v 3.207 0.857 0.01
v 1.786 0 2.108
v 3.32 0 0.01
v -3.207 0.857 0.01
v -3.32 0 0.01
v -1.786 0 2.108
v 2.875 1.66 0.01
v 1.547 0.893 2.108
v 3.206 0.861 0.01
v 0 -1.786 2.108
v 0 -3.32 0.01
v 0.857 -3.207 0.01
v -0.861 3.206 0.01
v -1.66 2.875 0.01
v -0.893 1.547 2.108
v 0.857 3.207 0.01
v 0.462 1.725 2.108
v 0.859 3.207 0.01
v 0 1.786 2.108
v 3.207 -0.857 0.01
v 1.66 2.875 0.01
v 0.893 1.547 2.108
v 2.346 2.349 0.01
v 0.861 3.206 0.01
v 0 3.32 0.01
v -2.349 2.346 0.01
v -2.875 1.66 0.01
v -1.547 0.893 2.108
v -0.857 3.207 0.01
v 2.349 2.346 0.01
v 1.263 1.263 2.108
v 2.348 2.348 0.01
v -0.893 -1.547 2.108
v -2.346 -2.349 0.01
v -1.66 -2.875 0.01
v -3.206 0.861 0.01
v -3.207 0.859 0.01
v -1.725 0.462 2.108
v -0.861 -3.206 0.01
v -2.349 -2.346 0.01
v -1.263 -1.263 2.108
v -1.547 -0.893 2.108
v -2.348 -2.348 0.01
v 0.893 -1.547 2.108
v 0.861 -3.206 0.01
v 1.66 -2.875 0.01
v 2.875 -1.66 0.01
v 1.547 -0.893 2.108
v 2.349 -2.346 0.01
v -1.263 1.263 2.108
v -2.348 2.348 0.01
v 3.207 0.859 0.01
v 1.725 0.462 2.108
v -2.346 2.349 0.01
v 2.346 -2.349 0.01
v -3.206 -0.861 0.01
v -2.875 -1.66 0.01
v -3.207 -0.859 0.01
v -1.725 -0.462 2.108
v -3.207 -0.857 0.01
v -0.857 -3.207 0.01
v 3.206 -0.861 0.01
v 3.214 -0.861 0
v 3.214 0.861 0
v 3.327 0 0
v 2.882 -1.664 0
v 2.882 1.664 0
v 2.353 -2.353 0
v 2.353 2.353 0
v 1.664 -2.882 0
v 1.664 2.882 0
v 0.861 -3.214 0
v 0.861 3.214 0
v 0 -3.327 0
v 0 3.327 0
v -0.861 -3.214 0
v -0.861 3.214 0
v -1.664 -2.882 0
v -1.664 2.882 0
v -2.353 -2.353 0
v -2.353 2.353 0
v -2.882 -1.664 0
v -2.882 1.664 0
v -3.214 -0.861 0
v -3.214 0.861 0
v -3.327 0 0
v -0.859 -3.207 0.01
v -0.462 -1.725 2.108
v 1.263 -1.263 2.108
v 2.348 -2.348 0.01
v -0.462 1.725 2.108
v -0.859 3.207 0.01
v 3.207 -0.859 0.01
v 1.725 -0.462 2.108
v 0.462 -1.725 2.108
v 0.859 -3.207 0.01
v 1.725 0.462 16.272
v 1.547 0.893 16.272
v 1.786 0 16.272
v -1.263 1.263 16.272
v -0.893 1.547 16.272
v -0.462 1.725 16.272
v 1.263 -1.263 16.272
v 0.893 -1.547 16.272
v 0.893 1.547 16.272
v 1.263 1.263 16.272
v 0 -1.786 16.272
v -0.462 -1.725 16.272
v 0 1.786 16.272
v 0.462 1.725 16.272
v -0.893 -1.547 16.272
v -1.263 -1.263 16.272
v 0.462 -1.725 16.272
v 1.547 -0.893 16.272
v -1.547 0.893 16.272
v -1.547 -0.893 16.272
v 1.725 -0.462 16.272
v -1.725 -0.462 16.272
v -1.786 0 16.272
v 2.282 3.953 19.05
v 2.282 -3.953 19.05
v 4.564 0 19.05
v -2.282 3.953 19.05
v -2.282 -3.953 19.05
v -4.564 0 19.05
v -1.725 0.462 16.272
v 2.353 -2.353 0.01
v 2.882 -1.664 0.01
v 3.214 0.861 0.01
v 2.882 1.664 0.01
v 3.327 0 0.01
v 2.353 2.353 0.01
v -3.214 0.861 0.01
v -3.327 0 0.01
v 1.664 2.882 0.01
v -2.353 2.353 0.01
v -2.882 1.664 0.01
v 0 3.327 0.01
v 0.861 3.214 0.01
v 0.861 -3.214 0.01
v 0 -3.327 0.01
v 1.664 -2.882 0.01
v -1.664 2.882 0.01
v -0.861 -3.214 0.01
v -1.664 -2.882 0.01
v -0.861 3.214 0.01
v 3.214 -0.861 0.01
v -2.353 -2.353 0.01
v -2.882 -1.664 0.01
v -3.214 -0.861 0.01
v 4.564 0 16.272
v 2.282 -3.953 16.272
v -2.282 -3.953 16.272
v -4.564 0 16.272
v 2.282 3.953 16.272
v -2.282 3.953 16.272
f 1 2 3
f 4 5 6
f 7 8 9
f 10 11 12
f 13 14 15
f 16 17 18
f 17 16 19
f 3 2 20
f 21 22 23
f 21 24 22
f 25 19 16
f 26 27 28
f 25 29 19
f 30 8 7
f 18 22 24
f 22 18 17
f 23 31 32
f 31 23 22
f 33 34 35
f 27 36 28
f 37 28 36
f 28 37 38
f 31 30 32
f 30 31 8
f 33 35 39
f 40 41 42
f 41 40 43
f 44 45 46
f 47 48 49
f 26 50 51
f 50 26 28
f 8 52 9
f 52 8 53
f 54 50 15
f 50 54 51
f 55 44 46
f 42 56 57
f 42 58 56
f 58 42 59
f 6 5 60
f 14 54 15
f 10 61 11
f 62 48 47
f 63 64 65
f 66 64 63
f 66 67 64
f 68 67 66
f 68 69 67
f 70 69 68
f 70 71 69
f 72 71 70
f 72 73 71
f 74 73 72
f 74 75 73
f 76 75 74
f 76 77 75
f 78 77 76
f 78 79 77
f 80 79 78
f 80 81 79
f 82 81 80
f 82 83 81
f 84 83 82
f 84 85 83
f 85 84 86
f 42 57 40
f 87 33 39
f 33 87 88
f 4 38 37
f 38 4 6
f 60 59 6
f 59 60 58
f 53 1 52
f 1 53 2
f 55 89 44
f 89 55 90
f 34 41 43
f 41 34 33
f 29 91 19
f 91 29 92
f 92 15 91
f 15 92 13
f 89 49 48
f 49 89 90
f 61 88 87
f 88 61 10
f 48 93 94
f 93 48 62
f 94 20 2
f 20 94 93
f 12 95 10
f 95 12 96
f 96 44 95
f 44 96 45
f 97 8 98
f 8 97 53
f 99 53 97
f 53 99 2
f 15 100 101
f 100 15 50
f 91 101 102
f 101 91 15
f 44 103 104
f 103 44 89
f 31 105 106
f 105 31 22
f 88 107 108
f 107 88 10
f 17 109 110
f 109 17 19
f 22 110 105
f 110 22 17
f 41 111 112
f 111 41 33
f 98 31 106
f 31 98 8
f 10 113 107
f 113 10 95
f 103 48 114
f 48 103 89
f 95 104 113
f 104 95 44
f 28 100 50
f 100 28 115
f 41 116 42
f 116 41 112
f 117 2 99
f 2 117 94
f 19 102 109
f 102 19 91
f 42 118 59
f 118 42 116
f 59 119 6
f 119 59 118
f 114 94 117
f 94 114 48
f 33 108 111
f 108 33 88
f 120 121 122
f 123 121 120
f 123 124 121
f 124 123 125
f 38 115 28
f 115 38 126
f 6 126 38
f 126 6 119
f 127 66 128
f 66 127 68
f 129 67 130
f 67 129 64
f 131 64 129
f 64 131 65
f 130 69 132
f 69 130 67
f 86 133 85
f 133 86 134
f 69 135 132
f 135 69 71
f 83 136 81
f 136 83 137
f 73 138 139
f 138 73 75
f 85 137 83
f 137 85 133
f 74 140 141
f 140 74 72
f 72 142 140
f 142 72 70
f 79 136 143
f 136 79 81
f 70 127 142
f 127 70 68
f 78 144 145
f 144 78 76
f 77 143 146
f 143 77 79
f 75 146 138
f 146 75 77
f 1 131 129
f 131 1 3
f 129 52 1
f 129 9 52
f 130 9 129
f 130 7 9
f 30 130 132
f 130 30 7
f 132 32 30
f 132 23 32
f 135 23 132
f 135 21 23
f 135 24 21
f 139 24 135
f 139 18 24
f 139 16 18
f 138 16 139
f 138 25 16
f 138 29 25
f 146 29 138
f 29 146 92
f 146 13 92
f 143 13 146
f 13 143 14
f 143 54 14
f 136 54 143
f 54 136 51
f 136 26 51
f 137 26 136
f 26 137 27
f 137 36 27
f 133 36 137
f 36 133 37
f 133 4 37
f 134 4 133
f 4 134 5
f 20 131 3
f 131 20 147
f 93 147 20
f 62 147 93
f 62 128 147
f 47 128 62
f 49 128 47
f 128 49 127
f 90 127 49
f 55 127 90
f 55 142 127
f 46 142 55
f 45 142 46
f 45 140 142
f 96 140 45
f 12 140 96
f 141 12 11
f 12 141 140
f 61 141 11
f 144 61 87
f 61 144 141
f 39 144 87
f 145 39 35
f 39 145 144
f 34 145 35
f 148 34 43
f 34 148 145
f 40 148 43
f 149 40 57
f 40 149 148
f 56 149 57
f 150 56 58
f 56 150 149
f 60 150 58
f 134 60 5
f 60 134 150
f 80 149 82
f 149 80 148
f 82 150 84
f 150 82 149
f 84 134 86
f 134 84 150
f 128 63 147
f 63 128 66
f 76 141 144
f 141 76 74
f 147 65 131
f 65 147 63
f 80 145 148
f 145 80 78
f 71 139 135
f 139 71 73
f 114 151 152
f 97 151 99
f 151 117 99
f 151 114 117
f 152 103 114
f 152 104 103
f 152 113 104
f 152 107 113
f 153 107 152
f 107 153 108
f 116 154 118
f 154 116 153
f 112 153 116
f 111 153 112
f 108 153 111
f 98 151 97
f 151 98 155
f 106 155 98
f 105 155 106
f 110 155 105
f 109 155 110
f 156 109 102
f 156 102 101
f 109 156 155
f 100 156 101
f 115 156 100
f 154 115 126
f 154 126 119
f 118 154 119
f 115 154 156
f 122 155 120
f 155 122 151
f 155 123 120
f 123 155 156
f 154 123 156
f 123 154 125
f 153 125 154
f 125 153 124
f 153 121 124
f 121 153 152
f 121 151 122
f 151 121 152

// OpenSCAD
// A small module defining some #6 hardware shapes
// Use solid=true to get the ouerall size of a cutout
// Use tol = .1 (or similar) to allow for printer inaccuracy
// 
IN_TO_MM = 25.4;

screw_and_nut(3/4 * IN_TO_MM, tol=0.0);
//hex_nut6_slot(10);

diameter6      = IN_TO_MM * 9 / 64;
nut6_outer_dia = IN_TO_MM * 23 / 64;
nut6_thickness = IN_TO_MM * 7 / 64;
head_height6 = IN_TO_MM * 0.083;
head_dia6    = IN_TO_MM * 0.262;


module screw_and_nut(length, tol=0.0) {
    translate ([0, 0, length-(nut6_thickness+tol)]) 
        hex_nut6(tol=tol, solid=false);
    machine_screw6(length, tol=tol);
}

    
module hex_nut6(tol = 0, solid = false) {
    linear_extrude (nut6_thickness+tol) {
        difference () {
            circle(tol + nut6_outer_dia/2, $fn = 6);
            if (!solid)
                circle(diameter6/2, $fn = 24);
        }

    }
}


module machine_screw6(length, tol=0)
{
    union() {
        translate([0, 0, tol]) {
            cylinder(head_height6, tol+head_dia6/2, tol+diameter6/2, $fn=24);
            cylinder(length-tol, tol+diameter6/2, tol+diameter6/2, $fn=24);
        }
        cylinder(tol+.01, tol+head_dia6/2, tol+head_dia6/2, $fn=24);
    }
}


module hex_nut6_slot(length, tol = 0) {
    linear_extrude (nut6_thickness+tol) {
        circle(tol + nut6_outer_dia/2, $fn = 6);
        translate([-(tol + nut6_outer_dia/2), 0, 0])
            square([tol + nut6_outer_dia, length]);
    }
}
